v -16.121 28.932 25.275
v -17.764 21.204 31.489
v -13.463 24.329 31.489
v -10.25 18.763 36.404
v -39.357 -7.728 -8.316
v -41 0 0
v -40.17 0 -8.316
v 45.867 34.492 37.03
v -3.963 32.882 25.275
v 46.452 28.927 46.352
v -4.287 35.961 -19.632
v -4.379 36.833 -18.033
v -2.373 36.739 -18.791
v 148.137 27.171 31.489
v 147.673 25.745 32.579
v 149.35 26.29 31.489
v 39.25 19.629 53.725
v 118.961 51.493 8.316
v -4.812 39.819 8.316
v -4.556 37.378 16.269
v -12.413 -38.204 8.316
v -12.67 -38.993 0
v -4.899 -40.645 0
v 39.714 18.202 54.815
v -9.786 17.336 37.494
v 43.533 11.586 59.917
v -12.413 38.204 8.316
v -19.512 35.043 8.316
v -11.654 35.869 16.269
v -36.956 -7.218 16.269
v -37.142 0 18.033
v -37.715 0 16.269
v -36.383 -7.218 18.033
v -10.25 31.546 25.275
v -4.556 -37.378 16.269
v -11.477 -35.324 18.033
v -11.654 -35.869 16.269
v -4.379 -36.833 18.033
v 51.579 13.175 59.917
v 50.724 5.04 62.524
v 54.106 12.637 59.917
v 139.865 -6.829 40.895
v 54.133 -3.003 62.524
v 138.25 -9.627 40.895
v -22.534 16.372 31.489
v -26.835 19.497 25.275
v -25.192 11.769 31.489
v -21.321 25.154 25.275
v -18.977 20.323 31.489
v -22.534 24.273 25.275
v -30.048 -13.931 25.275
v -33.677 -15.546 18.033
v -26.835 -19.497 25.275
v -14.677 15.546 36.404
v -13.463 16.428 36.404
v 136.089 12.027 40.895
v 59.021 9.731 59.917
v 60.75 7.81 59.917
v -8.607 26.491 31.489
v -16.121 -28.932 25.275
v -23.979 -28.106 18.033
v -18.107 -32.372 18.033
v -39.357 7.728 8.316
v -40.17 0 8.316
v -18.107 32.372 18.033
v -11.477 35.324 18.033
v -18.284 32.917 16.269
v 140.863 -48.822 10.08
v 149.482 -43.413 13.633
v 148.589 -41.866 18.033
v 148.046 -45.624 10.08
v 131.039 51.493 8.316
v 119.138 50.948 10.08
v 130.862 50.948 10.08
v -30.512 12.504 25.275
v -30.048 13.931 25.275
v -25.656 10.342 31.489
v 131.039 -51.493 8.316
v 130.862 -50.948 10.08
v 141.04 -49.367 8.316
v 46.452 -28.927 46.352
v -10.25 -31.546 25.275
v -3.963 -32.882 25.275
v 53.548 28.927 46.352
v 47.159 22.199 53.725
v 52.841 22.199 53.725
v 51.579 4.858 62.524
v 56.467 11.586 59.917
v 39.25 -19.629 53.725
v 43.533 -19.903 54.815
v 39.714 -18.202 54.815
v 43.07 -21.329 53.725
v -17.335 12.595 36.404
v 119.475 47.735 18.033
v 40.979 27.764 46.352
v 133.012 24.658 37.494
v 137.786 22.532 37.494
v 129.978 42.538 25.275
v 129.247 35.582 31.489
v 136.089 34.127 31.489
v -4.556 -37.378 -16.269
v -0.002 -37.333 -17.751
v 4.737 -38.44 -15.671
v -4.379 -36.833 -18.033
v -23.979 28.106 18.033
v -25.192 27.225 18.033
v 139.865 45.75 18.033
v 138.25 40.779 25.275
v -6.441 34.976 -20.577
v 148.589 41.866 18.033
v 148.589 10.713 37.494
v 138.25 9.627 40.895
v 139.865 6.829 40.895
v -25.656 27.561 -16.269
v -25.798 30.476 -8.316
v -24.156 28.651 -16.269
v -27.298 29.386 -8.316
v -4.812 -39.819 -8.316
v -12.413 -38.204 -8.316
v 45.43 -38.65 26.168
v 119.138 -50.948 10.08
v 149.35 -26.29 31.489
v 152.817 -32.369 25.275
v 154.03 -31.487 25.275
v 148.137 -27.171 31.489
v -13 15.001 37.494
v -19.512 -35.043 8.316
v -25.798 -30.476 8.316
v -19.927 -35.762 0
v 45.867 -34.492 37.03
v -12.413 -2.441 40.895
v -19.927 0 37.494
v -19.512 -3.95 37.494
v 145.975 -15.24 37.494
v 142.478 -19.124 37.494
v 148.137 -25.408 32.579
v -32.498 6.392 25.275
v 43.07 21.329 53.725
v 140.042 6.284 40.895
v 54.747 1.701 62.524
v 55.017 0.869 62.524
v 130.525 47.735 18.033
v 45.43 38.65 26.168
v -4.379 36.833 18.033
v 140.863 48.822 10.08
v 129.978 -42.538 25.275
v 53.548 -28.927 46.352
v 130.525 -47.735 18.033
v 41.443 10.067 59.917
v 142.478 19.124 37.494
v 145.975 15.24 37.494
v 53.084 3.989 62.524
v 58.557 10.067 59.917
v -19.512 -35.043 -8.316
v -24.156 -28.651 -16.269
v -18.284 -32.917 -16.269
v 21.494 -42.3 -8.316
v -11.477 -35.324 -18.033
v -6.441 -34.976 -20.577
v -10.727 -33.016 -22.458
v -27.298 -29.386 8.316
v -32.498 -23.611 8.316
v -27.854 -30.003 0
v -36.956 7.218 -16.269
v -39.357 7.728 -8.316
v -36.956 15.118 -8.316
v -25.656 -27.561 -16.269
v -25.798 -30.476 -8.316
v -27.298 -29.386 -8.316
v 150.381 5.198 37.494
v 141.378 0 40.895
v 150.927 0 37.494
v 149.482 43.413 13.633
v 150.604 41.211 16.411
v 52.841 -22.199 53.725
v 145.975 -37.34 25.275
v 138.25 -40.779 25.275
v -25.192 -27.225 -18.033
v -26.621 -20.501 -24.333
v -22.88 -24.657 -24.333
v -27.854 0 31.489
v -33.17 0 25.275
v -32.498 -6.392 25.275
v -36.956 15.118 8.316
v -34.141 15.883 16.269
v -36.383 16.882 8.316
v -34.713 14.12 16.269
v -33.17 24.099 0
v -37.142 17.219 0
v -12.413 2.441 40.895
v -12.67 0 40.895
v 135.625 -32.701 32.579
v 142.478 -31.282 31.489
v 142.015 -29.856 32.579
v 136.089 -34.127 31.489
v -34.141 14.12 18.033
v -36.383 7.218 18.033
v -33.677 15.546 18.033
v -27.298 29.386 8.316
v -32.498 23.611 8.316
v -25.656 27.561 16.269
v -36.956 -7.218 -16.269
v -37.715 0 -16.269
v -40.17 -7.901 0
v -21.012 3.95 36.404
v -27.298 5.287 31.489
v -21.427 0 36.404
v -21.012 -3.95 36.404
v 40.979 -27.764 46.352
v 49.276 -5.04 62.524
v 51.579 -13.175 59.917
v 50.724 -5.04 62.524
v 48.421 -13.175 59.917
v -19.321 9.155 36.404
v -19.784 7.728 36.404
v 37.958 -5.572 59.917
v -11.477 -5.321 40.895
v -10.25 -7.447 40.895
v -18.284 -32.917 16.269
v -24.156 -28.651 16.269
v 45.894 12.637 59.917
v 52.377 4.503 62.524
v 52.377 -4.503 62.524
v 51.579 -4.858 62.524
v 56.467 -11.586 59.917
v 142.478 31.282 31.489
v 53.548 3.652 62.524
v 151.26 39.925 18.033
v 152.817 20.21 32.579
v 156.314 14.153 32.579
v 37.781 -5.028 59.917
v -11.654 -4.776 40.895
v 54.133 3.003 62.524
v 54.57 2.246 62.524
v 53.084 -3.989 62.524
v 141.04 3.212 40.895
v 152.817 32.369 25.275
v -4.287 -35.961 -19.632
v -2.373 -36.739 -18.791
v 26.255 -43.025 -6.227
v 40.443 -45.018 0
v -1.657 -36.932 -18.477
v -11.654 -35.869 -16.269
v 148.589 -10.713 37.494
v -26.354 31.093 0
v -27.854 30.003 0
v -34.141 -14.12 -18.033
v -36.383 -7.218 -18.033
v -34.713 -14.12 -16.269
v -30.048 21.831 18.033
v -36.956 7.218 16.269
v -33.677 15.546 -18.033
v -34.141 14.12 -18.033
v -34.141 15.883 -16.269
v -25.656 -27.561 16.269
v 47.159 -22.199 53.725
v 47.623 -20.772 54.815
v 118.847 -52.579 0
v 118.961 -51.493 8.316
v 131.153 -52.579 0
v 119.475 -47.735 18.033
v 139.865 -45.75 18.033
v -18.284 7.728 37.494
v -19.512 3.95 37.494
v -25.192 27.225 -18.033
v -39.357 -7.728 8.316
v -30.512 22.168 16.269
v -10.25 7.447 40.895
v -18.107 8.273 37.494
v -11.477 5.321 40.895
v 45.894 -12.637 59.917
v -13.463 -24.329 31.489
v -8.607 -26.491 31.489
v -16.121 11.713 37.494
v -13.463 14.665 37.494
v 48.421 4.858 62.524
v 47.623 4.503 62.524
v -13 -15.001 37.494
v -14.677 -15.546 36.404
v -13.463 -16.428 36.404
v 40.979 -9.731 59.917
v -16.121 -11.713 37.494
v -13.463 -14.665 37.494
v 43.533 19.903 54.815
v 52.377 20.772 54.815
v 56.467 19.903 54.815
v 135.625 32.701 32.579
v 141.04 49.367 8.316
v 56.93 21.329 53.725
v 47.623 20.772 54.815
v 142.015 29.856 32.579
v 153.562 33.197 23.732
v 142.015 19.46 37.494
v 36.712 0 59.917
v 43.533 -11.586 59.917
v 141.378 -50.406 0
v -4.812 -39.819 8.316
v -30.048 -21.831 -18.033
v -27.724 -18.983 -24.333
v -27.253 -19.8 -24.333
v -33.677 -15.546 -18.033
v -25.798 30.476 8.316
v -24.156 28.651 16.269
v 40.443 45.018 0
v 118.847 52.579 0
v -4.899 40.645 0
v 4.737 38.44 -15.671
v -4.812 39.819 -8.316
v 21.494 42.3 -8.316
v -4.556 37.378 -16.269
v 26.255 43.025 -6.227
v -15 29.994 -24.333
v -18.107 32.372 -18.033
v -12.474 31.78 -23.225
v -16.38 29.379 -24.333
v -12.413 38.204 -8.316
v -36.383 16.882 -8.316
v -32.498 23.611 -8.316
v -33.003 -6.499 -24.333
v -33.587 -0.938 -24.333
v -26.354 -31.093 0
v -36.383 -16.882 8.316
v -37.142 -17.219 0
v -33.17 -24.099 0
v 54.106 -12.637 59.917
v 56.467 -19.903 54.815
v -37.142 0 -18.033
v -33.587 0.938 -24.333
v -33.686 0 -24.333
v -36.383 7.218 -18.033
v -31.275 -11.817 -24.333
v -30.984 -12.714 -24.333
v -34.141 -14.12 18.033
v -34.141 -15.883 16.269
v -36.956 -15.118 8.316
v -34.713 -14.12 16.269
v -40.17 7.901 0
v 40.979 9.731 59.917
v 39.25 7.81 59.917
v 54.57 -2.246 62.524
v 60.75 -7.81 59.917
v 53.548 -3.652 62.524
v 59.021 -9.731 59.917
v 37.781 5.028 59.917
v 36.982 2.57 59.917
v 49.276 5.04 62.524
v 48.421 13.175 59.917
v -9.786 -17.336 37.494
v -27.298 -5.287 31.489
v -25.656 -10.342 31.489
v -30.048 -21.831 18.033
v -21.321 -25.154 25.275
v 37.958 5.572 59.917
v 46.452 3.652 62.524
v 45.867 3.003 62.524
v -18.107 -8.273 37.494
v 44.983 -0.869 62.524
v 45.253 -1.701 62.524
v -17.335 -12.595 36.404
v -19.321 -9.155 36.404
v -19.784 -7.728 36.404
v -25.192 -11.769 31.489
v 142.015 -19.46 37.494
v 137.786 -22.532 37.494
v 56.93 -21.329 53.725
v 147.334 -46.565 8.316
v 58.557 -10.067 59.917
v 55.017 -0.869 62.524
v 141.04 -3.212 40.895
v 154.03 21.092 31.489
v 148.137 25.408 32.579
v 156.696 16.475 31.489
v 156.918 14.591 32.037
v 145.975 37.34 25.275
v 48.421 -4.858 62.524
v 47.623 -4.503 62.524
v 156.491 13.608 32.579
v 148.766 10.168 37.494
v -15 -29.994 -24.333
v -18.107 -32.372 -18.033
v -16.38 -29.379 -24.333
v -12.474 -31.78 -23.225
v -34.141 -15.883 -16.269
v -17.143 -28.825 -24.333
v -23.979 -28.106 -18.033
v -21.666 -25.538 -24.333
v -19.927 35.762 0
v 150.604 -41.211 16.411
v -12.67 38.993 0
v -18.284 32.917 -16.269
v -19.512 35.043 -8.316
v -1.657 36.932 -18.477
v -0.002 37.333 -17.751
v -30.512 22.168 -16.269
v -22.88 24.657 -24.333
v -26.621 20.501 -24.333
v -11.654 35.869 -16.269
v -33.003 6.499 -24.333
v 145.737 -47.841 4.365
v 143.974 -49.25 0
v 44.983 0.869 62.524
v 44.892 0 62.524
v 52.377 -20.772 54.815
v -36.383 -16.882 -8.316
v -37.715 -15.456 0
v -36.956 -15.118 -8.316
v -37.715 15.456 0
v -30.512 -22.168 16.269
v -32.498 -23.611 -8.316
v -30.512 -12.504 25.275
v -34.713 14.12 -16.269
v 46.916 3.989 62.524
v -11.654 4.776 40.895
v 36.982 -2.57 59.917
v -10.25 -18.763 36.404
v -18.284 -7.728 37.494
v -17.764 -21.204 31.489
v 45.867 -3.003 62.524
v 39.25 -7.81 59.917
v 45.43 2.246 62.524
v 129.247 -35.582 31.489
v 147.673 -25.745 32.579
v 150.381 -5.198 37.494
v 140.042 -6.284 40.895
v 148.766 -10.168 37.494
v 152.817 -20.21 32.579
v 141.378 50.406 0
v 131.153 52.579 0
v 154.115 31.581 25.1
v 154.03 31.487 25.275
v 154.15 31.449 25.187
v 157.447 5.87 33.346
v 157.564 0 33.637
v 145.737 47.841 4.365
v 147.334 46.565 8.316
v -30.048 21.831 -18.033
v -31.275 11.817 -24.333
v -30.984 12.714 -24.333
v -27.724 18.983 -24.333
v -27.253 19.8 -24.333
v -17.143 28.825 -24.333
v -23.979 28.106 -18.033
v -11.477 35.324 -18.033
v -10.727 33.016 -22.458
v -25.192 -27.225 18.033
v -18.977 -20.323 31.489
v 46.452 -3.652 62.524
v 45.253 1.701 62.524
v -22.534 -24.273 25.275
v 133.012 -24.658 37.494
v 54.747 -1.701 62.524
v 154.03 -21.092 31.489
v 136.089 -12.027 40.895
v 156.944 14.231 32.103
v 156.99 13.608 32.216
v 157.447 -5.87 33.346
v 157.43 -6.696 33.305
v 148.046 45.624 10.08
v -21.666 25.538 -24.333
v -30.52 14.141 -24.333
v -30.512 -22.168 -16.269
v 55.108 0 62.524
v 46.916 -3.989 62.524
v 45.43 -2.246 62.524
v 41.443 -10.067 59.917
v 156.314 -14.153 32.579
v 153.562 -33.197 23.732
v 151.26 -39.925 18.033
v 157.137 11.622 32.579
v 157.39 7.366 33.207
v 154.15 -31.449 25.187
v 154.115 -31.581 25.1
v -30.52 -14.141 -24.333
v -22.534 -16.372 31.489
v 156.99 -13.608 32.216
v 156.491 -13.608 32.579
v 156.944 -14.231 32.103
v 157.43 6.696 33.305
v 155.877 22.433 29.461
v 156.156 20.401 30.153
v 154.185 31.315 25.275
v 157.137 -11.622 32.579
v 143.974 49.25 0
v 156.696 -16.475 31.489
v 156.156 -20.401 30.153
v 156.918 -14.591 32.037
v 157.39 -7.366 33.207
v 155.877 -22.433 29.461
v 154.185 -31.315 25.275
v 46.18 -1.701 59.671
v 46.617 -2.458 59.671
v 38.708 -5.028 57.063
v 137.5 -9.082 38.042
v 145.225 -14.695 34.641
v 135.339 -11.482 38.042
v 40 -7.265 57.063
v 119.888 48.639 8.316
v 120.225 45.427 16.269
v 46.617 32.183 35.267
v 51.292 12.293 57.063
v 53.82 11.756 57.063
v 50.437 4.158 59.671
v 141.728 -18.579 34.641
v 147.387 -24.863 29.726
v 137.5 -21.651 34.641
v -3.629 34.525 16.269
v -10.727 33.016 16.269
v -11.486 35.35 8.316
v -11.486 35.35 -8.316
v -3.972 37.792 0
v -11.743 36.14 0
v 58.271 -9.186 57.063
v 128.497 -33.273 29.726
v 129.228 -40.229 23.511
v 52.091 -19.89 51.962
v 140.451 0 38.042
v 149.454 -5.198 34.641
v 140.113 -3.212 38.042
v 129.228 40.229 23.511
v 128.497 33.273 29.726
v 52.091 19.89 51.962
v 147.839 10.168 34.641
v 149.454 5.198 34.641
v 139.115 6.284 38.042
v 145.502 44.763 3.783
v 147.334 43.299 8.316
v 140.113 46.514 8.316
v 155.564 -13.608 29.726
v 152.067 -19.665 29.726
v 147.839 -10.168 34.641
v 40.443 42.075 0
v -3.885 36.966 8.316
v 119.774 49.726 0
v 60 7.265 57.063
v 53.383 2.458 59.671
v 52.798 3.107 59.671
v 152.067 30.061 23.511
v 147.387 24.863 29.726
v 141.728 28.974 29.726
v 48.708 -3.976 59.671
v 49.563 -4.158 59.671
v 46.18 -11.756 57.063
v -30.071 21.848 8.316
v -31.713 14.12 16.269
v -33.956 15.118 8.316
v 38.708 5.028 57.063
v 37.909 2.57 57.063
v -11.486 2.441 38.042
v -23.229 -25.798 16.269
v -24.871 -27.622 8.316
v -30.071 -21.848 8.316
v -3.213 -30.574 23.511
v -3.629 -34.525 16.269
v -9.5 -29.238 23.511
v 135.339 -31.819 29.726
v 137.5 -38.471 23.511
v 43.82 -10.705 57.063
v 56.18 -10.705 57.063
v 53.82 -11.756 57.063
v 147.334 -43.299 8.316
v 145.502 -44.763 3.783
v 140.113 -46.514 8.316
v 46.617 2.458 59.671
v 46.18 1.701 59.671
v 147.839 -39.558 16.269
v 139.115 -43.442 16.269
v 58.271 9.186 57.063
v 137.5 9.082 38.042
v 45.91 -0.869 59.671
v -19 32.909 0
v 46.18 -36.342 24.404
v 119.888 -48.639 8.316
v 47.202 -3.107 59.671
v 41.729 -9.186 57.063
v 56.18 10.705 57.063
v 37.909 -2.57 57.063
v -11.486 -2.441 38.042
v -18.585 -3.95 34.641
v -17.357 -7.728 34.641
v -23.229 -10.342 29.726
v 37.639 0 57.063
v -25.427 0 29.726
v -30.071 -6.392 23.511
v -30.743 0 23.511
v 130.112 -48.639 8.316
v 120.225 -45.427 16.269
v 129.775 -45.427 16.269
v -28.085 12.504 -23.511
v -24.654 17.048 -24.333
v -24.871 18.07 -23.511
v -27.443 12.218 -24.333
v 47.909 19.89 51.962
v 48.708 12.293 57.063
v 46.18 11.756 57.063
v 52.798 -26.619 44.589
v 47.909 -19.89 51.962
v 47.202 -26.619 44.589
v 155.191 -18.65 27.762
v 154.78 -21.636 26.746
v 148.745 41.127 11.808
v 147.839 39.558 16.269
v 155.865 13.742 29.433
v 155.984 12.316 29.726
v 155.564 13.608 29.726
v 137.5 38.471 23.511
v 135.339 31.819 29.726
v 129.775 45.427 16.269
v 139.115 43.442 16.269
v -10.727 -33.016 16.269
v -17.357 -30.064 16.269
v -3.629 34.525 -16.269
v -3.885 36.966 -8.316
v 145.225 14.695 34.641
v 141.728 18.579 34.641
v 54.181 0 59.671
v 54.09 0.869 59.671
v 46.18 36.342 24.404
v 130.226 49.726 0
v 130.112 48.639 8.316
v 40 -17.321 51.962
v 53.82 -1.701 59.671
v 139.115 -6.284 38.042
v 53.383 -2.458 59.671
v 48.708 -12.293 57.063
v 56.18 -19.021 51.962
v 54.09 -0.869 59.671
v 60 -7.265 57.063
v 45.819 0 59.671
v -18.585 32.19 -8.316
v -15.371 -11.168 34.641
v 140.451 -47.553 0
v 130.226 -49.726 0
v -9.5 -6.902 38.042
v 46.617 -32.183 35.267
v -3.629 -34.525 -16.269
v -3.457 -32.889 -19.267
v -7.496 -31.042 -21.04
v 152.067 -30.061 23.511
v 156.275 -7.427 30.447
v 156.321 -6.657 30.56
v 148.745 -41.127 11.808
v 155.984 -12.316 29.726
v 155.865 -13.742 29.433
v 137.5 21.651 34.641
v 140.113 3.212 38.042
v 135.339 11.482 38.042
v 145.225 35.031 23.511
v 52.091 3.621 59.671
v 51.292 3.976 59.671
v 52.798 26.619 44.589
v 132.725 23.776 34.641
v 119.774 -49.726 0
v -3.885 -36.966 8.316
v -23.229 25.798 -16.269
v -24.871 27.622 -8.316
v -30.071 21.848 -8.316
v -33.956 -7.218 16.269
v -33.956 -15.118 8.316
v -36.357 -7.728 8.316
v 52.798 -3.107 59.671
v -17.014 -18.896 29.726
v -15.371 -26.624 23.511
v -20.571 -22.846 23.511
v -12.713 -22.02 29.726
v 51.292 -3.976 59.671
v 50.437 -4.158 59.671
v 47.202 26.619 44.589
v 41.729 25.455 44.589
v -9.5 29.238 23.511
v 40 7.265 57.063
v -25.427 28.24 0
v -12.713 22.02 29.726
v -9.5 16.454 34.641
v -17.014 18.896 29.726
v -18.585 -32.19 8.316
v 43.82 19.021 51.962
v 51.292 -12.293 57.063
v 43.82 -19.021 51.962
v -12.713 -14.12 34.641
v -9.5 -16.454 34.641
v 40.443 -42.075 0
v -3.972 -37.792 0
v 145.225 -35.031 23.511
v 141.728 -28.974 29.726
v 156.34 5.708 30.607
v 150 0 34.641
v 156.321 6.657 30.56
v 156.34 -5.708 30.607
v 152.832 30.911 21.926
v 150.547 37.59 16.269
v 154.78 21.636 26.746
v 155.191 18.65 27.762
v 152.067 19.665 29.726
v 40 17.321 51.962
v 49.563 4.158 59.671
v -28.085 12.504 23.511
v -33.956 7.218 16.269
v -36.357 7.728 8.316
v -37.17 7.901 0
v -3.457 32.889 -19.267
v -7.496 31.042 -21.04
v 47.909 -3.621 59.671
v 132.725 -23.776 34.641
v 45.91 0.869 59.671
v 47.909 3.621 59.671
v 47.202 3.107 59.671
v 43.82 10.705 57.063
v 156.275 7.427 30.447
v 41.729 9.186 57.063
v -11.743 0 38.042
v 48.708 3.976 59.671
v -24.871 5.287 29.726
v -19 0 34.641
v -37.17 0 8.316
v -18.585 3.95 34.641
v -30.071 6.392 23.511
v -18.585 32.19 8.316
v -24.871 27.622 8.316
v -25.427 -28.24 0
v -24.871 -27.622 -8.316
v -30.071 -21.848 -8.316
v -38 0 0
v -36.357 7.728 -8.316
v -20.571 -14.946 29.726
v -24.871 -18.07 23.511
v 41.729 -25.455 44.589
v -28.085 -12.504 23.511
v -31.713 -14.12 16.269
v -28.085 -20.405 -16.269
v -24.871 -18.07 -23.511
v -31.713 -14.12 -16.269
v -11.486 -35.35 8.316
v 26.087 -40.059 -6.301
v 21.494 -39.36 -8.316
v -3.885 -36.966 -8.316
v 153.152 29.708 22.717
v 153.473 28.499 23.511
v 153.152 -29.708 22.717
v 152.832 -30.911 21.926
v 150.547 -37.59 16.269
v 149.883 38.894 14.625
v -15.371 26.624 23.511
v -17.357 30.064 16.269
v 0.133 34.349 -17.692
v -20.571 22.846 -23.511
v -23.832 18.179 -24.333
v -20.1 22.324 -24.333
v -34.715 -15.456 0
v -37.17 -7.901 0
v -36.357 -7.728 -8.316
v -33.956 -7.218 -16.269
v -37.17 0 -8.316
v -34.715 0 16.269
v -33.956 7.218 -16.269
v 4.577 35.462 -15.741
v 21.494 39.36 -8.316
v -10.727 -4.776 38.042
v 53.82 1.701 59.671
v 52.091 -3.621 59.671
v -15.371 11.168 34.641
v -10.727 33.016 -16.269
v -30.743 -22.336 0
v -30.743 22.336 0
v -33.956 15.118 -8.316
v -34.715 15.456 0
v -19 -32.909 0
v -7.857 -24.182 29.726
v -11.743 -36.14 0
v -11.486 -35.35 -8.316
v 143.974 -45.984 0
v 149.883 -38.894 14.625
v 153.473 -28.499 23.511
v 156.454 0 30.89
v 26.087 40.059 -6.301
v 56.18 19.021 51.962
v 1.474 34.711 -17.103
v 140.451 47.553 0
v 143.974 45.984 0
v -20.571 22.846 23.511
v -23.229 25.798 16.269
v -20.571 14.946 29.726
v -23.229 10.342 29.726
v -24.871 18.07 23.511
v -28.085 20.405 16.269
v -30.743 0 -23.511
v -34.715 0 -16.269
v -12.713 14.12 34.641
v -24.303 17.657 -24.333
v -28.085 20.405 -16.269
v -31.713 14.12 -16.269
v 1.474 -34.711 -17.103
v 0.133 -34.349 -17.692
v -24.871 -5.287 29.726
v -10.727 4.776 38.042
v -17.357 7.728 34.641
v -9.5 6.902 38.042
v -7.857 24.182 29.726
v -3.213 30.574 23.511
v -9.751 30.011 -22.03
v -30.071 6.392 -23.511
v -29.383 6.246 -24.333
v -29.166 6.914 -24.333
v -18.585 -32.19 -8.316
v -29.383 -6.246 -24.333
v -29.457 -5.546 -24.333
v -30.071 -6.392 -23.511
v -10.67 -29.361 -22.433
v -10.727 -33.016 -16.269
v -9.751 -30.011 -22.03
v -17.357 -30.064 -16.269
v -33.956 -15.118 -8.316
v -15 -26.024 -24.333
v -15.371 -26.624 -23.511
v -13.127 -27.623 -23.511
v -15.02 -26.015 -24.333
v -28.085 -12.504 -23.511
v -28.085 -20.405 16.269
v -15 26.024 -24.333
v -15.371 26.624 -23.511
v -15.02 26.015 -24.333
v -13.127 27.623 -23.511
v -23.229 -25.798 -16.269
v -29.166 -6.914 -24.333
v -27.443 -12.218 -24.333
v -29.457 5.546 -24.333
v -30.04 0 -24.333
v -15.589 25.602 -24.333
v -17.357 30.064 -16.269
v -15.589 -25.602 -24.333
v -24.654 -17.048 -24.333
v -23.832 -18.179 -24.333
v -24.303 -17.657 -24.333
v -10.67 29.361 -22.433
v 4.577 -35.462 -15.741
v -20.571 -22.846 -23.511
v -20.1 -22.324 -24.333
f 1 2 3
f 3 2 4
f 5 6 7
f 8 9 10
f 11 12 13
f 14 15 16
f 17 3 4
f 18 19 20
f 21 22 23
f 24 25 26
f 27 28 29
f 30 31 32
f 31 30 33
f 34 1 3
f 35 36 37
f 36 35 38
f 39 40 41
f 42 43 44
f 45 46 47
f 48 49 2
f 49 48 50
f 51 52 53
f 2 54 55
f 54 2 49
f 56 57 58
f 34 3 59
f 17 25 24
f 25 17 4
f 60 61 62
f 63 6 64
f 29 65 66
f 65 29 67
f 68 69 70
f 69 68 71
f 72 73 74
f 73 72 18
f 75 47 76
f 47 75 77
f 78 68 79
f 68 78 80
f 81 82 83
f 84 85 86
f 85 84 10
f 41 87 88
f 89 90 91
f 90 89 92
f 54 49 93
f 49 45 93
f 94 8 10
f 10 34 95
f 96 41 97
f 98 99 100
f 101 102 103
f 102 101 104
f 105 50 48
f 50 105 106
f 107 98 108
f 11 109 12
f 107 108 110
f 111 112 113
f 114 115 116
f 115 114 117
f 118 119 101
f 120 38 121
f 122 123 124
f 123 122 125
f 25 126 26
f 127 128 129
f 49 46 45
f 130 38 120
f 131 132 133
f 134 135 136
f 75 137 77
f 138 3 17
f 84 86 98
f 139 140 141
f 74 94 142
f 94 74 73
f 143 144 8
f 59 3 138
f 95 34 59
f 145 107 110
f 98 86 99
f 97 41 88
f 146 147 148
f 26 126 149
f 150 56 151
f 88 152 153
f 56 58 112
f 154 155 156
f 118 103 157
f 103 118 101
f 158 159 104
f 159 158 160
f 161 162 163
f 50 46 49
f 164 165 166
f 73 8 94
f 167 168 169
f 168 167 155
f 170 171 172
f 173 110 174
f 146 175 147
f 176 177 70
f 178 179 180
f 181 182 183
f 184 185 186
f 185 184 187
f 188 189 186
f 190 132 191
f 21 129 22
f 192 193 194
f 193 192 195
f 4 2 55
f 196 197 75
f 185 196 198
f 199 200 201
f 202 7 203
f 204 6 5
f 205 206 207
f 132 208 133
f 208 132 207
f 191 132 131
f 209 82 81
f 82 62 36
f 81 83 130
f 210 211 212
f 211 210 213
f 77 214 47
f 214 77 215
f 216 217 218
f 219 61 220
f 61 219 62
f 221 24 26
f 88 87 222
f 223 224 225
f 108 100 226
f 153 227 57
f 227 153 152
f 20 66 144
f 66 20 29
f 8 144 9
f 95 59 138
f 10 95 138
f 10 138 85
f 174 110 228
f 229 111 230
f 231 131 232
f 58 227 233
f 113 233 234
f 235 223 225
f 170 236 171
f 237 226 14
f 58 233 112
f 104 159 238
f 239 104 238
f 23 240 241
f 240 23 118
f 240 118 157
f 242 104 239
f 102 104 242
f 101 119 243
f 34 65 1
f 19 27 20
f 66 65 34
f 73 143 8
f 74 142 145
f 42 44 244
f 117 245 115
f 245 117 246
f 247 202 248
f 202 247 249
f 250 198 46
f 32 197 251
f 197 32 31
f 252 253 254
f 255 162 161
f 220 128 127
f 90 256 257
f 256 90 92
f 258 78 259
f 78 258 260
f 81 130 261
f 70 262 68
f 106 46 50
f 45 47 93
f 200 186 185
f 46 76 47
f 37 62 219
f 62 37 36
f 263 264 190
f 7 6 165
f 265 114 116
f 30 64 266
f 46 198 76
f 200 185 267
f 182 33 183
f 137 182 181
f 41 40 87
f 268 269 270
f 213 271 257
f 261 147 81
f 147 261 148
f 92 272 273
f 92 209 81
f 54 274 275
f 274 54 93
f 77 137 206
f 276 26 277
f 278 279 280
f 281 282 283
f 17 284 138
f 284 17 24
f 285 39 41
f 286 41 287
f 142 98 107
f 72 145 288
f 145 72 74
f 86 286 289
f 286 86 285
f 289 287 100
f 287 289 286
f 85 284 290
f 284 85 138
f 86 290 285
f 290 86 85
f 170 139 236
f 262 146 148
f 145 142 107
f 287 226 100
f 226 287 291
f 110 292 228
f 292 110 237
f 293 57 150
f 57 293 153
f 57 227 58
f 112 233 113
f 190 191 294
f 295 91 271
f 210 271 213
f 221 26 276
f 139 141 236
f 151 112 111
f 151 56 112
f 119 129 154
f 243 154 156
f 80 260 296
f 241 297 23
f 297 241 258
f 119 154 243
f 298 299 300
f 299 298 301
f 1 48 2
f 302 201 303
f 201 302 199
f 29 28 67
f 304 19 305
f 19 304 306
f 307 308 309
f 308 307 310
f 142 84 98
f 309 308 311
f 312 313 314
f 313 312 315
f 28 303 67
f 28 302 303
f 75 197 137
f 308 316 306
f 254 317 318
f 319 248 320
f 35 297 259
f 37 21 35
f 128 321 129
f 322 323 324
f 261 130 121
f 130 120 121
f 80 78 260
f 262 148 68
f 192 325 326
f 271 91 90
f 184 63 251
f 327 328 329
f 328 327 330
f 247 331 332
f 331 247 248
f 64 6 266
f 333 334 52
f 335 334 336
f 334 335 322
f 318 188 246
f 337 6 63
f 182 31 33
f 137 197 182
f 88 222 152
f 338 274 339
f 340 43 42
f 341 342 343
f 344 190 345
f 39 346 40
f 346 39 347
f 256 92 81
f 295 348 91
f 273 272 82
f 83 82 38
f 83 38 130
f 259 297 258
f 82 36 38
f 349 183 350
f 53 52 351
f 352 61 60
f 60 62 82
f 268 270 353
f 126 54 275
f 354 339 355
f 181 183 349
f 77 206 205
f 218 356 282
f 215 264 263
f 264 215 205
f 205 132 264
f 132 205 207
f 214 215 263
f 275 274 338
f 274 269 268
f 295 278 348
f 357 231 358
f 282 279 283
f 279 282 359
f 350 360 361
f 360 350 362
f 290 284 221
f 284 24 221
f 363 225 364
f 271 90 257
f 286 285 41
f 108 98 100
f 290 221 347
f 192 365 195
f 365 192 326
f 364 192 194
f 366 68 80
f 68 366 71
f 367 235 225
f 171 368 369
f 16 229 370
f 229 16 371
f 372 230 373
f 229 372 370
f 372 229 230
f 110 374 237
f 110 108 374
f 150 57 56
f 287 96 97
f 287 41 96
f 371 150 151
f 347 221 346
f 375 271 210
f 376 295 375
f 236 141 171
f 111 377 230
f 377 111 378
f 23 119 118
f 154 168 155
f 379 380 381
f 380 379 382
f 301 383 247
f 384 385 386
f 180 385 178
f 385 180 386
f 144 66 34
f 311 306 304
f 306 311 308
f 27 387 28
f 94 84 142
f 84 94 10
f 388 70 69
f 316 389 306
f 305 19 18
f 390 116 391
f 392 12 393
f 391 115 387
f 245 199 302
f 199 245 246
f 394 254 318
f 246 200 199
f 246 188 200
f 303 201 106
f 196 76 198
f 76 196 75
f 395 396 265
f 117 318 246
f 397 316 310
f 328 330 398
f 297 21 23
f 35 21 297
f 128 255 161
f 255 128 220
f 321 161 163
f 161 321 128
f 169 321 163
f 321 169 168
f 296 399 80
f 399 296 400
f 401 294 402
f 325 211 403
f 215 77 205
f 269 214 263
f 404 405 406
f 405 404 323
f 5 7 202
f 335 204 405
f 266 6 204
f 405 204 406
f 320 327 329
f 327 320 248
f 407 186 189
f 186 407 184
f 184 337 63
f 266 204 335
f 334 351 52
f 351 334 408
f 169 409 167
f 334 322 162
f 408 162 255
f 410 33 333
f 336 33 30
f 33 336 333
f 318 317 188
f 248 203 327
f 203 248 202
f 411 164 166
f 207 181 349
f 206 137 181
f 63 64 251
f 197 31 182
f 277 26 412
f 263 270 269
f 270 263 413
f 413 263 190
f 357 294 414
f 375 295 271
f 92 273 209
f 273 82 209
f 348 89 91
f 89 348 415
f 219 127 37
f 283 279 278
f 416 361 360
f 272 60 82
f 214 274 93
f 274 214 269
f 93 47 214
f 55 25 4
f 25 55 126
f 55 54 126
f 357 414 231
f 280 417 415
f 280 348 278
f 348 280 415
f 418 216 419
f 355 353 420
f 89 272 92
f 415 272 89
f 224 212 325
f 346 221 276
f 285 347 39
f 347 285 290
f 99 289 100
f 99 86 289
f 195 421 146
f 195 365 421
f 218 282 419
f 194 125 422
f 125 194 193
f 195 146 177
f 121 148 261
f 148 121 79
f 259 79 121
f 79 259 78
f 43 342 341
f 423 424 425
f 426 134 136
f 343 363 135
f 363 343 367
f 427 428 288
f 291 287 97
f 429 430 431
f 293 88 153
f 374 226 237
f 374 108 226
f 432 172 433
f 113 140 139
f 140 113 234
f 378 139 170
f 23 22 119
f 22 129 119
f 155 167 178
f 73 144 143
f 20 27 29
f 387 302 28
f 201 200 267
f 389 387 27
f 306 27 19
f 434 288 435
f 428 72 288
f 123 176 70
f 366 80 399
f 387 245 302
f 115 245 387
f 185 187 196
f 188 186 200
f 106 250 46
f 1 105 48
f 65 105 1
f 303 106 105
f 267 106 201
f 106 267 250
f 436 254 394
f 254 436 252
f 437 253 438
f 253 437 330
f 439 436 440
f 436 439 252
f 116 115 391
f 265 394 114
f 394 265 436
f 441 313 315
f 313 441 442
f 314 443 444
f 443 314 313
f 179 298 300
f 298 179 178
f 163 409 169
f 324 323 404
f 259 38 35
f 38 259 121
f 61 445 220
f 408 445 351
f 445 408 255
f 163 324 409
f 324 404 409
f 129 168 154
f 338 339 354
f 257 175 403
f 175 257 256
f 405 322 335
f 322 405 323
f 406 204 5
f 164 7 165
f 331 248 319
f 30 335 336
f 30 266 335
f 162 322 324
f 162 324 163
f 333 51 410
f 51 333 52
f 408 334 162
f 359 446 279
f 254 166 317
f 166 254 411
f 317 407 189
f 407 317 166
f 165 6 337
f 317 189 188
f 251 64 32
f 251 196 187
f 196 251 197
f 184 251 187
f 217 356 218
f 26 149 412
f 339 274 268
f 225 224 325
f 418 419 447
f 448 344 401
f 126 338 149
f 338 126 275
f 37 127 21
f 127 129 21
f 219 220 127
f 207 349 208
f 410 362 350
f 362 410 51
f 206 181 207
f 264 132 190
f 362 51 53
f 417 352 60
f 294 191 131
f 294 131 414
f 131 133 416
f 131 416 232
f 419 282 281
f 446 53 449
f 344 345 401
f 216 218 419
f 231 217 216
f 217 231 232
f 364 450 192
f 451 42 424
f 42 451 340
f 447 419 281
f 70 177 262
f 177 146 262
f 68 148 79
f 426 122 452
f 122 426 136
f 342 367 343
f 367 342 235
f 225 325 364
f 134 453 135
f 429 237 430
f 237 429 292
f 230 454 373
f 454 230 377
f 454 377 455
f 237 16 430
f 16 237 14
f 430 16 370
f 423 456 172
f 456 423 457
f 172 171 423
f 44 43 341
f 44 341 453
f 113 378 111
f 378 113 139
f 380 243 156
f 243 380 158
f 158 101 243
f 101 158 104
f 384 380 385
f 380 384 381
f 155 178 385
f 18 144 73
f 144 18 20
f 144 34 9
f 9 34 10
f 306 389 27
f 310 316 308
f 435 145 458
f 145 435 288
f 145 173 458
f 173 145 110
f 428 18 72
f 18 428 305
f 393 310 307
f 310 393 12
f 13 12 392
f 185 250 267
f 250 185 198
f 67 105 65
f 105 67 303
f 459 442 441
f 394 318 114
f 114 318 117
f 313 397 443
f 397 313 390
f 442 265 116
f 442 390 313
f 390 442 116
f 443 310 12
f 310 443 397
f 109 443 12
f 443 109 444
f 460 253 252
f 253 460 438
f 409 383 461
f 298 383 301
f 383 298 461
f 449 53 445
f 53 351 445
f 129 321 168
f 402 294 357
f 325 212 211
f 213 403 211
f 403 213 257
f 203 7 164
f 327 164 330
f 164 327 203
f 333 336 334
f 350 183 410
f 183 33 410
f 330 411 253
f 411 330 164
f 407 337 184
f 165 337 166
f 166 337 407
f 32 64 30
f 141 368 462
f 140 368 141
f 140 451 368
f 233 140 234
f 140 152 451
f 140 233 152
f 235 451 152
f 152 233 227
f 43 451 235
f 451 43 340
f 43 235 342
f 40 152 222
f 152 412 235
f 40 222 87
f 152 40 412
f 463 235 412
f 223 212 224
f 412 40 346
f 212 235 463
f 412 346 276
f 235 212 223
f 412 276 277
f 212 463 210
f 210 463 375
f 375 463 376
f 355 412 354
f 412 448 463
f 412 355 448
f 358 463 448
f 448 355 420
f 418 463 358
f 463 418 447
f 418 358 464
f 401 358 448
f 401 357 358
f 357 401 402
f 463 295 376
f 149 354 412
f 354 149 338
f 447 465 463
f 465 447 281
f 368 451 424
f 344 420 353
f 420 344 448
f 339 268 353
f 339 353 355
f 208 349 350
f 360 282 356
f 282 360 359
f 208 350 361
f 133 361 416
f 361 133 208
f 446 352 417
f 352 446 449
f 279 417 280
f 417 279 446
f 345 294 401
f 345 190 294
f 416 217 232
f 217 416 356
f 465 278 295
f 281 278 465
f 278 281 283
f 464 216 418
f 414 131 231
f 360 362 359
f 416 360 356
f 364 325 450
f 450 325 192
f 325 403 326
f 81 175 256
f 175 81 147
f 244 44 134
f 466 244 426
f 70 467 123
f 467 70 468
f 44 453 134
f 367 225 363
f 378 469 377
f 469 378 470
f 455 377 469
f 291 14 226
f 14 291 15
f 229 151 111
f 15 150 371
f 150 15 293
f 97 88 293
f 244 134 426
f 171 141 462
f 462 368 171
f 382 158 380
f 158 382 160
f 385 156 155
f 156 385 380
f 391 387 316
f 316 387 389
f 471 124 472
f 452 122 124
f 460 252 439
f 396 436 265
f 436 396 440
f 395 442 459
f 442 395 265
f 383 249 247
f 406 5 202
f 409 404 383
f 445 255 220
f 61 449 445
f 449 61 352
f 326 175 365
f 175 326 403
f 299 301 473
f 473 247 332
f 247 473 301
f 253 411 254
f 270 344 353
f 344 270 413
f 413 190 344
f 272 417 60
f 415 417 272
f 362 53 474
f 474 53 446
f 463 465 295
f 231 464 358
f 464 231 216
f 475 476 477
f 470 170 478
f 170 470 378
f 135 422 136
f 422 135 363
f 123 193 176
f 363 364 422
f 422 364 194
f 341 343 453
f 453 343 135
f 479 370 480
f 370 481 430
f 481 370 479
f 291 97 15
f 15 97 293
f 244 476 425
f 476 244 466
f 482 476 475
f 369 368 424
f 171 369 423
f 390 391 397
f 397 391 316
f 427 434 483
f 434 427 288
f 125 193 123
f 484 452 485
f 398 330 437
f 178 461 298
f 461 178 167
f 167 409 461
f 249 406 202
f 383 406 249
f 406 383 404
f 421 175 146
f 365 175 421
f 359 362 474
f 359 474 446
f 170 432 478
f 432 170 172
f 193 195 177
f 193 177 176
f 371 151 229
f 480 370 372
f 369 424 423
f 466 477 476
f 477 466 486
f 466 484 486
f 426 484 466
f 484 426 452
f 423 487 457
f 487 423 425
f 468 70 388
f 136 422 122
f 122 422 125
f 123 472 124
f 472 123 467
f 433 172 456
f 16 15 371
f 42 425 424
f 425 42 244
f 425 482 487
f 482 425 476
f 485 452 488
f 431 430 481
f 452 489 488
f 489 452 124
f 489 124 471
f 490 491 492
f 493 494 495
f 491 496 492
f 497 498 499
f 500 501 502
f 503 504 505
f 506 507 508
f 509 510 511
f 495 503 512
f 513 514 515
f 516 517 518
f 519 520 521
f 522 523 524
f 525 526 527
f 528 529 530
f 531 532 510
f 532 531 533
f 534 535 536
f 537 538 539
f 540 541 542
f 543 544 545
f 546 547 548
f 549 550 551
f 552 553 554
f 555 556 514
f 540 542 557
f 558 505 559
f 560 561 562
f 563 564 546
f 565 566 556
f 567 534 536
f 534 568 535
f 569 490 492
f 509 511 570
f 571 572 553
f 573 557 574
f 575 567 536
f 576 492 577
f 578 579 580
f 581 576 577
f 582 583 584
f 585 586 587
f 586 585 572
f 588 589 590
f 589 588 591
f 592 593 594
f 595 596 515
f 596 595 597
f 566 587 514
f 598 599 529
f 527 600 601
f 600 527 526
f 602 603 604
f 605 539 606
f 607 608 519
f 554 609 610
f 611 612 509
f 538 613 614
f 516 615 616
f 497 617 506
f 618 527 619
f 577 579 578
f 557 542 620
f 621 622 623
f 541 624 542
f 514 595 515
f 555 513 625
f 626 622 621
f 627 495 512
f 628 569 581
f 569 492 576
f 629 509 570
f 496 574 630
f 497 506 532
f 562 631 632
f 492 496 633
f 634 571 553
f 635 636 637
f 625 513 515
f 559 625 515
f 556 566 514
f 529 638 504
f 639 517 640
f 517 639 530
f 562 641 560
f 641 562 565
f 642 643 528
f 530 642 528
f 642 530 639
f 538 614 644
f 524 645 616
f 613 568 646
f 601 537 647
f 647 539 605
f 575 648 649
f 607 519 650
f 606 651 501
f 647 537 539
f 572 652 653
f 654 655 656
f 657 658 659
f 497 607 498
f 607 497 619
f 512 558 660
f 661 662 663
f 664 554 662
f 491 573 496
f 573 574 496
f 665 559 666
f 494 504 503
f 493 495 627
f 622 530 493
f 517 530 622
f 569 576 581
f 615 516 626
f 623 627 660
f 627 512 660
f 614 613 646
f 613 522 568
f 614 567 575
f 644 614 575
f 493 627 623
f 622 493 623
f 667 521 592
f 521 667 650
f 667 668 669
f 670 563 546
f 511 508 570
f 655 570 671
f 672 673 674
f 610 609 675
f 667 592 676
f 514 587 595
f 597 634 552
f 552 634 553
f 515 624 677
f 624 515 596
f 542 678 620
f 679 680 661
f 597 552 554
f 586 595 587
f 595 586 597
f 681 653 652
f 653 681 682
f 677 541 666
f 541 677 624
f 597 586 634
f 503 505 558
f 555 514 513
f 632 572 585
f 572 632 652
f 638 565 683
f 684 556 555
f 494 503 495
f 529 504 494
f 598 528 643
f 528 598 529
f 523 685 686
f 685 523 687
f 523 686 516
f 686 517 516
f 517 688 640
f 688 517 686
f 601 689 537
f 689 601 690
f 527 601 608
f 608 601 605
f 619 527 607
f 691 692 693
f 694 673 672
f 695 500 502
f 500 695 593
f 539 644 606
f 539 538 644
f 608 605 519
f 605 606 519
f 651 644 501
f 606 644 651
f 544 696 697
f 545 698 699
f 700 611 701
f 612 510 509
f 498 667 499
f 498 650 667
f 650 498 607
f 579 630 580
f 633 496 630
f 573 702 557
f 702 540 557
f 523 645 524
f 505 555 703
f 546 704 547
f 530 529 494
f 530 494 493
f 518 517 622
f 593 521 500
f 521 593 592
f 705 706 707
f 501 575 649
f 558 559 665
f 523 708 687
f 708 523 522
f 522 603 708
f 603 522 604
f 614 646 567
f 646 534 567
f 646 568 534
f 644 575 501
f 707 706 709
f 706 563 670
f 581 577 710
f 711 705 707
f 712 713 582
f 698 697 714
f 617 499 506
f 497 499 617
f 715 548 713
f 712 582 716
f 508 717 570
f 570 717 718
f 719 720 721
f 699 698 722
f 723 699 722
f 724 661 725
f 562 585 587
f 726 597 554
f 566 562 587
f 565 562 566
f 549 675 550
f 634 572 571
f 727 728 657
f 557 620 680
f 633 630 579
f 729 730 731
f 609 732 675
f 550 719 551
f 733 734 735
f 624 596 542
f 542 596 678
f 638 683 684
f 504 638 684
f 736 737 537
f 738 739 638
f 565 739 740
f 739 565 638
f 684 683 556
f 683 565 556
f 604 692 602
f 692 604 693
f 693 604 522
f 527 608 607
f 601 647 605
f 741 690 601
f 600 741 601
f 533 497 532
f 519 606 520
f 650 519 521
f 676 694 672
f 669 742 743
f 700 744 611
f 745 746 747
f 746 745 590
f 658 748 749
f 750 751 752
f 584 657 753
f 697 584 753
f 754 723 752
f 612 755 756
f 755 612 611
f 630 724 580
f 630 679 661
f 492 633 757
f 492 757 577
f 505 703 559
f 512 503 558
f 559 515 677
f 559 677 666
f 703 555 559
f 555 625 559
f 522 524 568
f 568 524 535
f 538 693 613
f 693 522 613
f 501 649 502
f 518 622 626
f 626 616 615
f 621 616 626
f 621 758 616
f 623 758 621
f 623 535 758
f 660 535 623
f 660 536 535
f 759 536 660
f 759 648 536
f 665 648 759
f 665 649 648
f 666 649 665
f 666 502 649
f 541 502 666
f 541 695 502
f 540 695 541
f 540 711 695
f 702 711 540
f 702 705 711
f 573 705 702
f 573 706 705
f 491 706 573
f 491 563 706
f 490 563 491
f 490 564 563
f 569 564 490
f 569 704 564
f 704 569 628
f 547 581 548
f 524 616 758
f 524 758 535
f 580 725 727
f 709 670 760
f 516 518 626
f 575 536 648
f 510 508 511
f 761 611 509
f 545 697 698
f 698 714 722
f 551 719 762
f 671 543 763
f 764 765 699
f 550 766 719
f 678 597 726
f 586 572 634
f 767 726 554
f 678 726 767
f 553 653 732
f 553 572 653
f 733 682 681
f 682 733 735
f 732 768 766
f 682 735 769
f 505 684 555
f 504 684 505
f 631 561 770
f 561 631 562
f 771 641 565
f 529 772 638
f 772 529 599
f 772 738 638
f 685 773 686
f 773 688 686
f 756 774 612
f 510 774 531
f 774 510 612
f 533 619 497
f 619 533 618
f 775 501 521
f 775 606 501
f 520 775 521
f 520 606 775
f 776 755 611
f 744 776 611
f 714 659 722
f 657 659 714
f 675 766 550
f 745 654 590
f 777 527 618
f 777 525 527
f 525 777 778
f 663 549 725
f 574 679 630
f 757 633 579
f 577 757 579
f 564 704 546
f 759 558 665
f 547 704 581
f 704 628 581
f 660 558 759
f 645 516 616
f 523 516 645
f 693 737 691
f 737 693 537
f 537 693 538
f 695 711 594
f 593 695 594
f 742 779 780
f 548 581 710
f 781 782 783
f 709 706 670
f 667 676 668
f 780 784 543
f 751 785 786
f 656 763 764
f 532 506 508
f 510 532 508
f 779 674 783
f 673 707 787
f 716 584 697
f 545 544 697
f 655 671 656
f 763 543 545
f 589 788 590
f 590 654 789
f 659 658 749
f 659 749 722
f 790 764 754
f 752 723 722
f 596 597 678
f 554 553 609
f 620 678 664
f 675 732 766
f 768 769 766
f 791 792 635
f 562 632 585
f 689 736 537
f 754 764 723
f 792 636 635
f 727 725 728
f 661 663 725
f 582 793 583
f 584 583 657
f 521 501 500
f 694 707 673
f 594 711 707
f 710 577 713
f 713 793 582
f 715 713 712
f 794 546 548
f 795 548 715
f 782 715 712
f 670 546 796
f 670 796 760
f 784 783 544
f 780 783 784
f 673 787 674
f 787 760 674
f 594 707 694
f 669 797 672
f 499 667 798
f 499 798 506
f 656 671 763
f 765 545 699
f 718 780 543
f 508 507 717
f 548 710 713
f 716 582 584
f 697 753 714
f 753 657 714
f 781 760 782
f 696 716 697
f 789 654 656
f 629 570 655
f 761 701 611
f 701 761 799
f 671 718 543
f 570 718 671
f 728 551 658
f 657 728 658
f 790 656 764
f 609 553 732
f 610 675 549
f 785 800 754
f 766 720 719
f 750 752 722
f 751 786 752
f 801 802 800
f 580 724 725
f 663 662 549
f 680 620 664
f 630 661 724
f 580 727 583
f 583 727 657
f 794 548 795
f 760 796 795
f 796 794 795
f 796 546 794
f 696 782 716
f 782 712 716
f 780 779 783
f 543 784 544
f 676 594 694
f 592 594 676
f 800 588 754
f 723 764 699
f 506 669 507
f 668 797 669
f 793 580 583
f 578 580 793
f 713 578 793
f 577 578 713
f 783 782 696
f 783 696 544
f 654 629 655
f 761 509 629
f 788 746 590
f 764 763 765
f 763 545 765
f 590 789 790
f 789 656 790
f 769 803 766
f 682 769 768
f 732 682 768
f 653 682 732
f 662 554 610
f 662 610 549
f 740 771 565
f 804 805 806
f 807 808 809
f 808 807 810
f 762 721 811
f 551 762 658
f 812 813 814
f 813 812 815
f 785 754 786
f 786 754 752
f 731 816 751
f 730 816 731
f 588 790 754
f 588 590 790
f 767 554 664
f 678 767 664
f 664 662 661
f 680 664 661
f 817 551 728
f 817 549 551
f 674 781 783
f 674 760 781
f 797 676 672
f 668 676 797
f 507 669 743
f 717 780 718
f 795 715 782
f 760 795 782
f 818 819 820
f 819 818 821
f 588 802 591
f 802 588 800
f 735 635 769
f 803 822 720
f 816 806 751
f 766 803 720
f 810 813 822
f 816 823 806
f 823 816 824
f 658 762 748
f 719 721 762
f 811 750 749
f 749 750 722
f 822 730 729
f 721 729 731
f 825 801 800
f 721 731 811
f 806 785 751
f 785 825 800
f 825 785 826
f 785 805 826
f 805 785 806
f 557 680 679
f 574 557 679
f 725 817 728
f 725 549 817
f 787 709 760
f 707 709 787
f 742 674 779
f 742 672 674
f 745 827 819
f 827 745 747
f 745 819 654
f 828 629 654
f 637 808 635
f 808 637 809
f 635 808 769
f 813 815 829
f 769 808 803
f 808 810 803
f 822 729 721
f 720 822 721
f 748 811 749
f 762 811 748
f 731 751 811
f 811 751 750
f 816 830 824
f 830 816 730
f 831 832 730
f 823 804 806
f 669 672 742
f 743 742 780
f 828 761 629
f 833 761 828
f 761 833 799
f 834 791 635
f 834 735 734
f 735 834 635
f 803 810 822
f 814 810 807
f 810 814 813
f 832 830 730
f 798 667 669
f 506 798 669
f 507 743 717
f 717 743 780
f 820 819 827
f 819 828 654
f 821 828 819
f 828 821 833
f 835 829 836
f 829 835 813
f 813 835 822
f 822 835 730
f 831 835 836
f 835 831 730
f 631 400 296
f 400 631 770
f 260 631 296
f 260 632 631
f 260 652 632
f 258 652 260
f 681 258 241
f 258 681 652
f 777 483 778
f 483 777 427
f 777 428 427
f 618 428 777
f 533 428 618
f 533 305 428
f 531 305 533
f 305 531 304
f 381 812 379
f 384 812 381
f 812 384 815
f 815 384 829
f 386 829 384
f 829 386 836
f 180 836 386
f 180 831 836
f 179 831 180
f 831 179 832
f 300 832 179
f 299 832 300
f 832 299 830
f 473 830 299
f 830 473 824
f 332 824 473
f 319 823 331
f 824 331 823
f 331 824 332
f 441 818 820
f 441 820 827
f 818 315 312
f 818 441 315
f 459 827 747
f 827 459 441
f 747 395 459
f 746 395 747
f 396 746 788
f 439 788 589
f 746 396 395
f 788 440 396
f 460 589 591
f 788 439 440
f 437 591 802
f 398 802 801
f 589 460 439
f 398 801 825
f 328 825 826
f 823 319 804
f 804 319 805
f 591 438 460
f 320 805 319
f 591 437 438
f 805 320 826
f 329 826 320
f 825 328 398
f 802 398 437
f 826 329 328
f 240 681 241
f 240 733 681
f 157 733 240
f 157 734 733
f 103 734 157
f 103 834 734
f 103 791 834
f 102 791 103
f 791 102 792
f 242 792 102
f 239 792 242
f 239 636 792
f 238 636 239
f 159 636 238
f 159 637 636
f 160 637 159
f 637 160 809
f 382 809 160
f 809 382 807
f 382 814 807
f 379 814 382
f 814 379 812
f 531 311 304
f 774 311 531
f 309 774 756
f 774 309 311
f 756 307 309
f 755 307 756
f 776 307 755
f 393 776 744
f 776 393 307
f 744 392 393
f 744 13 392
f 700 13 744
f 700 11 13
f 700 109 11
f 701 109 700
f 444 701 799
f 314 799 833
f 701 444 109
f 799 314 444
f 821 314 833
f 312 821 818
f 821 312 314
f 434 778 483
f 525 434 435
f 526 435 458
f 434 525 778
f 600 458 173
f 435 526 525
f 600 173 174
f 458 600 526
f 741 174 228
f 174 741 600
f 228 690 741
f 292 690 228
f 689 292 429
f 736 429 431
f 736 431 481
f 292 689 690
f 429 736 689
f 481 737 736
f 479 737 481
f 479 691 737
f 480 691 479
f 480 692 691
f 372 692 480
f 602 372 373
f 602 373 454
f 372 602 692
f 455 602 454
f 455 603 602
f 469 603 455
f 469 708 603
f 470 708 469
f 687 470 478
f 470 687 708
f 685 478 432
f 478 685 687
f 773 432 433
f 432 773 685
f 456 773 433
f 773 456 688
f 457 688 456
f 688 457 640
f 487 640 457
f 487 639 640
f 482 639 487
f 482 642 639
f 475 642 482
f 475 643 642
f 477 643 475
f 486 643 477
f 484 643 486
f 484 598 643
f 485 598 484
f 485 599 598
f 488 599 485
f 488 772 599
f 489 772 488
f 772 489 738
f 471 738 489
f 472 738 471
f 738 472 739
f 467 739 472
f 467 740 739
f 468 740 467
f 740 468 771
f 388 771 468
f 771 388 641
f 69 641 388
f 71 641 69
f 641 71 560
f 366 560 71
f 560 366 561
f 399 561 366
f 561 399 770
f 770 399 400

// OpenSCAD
function tot_dist(arr, index) = index == 0 ? arr[index] : arr[index] + tot_dist(arr, index-1);


module finger(seg_wid, seg_dist, seg_ht) {
    if(is_list(seg_wid) && 
        is_list(seg_dist) && 
        is_list(seg_ht) &&
        len(seg_wid) == len(seg_ht) &&
        len(seg_dist) == len(seg_ht) -1) {
            
          hull(){
            difference() {
               union() {
                   for(i=[0:1:len(seg_wid) -1]) {
                       if (i!=0) {
                           translate([tot_dist(seg_dist, i-1),0,0])
                           scale([1,1,seg_ht[i]/seg_wid[i]])
                           sphere(r=seg_wid[i], center=true);
                       } else {
                           scale([1,1,seg_ht[i]/seg_wid[i]])
                           sphere(r=seg_wid[i], center=true);
                       };  
                   }
                };
           }
               
           }
            
     } else {
         echo("bad parameters");
     }

}

module shell(thickness=3) {
    difference() {
        minkowski() {
            children(0);
            sphere(r=thickness, center=true);
        }
        children(0);
    };

}


module genTip(seg_wid, seg_dist, seg_ht) {
    difference() {
        shell(3){   
            finger(seg_wid, seg_dist, seg_ht);
        };
     
    }
}

module genMask (l, h) {
    translate([0,0,-(h+1)])
    union(){
        difference() {
            linear_extrude(h+1)
            scale(1.1)
            projection(){
                children(0);
            }
            translate([-115,-100, h*2/3])
            linear_extrude(h/3+3, scale=1.6)
            square([100,200]);
        }
        
        translate([l+75,0,0])
        rotate(a=22, v=[0,1,0])
        cube([120,200 ,400], center=true);
    }
}
difference() {
    render() {
        genTip (seg_wid=[38,40,50], seg_dist=[50,75], seg_ht=[40,60,40]);
    }
    genMask(h=70, l=105){
        genTip (seg_wid=[38,40,50], seg_dist=[50,75], seg_ht=[40,60,40]);
    }
}
